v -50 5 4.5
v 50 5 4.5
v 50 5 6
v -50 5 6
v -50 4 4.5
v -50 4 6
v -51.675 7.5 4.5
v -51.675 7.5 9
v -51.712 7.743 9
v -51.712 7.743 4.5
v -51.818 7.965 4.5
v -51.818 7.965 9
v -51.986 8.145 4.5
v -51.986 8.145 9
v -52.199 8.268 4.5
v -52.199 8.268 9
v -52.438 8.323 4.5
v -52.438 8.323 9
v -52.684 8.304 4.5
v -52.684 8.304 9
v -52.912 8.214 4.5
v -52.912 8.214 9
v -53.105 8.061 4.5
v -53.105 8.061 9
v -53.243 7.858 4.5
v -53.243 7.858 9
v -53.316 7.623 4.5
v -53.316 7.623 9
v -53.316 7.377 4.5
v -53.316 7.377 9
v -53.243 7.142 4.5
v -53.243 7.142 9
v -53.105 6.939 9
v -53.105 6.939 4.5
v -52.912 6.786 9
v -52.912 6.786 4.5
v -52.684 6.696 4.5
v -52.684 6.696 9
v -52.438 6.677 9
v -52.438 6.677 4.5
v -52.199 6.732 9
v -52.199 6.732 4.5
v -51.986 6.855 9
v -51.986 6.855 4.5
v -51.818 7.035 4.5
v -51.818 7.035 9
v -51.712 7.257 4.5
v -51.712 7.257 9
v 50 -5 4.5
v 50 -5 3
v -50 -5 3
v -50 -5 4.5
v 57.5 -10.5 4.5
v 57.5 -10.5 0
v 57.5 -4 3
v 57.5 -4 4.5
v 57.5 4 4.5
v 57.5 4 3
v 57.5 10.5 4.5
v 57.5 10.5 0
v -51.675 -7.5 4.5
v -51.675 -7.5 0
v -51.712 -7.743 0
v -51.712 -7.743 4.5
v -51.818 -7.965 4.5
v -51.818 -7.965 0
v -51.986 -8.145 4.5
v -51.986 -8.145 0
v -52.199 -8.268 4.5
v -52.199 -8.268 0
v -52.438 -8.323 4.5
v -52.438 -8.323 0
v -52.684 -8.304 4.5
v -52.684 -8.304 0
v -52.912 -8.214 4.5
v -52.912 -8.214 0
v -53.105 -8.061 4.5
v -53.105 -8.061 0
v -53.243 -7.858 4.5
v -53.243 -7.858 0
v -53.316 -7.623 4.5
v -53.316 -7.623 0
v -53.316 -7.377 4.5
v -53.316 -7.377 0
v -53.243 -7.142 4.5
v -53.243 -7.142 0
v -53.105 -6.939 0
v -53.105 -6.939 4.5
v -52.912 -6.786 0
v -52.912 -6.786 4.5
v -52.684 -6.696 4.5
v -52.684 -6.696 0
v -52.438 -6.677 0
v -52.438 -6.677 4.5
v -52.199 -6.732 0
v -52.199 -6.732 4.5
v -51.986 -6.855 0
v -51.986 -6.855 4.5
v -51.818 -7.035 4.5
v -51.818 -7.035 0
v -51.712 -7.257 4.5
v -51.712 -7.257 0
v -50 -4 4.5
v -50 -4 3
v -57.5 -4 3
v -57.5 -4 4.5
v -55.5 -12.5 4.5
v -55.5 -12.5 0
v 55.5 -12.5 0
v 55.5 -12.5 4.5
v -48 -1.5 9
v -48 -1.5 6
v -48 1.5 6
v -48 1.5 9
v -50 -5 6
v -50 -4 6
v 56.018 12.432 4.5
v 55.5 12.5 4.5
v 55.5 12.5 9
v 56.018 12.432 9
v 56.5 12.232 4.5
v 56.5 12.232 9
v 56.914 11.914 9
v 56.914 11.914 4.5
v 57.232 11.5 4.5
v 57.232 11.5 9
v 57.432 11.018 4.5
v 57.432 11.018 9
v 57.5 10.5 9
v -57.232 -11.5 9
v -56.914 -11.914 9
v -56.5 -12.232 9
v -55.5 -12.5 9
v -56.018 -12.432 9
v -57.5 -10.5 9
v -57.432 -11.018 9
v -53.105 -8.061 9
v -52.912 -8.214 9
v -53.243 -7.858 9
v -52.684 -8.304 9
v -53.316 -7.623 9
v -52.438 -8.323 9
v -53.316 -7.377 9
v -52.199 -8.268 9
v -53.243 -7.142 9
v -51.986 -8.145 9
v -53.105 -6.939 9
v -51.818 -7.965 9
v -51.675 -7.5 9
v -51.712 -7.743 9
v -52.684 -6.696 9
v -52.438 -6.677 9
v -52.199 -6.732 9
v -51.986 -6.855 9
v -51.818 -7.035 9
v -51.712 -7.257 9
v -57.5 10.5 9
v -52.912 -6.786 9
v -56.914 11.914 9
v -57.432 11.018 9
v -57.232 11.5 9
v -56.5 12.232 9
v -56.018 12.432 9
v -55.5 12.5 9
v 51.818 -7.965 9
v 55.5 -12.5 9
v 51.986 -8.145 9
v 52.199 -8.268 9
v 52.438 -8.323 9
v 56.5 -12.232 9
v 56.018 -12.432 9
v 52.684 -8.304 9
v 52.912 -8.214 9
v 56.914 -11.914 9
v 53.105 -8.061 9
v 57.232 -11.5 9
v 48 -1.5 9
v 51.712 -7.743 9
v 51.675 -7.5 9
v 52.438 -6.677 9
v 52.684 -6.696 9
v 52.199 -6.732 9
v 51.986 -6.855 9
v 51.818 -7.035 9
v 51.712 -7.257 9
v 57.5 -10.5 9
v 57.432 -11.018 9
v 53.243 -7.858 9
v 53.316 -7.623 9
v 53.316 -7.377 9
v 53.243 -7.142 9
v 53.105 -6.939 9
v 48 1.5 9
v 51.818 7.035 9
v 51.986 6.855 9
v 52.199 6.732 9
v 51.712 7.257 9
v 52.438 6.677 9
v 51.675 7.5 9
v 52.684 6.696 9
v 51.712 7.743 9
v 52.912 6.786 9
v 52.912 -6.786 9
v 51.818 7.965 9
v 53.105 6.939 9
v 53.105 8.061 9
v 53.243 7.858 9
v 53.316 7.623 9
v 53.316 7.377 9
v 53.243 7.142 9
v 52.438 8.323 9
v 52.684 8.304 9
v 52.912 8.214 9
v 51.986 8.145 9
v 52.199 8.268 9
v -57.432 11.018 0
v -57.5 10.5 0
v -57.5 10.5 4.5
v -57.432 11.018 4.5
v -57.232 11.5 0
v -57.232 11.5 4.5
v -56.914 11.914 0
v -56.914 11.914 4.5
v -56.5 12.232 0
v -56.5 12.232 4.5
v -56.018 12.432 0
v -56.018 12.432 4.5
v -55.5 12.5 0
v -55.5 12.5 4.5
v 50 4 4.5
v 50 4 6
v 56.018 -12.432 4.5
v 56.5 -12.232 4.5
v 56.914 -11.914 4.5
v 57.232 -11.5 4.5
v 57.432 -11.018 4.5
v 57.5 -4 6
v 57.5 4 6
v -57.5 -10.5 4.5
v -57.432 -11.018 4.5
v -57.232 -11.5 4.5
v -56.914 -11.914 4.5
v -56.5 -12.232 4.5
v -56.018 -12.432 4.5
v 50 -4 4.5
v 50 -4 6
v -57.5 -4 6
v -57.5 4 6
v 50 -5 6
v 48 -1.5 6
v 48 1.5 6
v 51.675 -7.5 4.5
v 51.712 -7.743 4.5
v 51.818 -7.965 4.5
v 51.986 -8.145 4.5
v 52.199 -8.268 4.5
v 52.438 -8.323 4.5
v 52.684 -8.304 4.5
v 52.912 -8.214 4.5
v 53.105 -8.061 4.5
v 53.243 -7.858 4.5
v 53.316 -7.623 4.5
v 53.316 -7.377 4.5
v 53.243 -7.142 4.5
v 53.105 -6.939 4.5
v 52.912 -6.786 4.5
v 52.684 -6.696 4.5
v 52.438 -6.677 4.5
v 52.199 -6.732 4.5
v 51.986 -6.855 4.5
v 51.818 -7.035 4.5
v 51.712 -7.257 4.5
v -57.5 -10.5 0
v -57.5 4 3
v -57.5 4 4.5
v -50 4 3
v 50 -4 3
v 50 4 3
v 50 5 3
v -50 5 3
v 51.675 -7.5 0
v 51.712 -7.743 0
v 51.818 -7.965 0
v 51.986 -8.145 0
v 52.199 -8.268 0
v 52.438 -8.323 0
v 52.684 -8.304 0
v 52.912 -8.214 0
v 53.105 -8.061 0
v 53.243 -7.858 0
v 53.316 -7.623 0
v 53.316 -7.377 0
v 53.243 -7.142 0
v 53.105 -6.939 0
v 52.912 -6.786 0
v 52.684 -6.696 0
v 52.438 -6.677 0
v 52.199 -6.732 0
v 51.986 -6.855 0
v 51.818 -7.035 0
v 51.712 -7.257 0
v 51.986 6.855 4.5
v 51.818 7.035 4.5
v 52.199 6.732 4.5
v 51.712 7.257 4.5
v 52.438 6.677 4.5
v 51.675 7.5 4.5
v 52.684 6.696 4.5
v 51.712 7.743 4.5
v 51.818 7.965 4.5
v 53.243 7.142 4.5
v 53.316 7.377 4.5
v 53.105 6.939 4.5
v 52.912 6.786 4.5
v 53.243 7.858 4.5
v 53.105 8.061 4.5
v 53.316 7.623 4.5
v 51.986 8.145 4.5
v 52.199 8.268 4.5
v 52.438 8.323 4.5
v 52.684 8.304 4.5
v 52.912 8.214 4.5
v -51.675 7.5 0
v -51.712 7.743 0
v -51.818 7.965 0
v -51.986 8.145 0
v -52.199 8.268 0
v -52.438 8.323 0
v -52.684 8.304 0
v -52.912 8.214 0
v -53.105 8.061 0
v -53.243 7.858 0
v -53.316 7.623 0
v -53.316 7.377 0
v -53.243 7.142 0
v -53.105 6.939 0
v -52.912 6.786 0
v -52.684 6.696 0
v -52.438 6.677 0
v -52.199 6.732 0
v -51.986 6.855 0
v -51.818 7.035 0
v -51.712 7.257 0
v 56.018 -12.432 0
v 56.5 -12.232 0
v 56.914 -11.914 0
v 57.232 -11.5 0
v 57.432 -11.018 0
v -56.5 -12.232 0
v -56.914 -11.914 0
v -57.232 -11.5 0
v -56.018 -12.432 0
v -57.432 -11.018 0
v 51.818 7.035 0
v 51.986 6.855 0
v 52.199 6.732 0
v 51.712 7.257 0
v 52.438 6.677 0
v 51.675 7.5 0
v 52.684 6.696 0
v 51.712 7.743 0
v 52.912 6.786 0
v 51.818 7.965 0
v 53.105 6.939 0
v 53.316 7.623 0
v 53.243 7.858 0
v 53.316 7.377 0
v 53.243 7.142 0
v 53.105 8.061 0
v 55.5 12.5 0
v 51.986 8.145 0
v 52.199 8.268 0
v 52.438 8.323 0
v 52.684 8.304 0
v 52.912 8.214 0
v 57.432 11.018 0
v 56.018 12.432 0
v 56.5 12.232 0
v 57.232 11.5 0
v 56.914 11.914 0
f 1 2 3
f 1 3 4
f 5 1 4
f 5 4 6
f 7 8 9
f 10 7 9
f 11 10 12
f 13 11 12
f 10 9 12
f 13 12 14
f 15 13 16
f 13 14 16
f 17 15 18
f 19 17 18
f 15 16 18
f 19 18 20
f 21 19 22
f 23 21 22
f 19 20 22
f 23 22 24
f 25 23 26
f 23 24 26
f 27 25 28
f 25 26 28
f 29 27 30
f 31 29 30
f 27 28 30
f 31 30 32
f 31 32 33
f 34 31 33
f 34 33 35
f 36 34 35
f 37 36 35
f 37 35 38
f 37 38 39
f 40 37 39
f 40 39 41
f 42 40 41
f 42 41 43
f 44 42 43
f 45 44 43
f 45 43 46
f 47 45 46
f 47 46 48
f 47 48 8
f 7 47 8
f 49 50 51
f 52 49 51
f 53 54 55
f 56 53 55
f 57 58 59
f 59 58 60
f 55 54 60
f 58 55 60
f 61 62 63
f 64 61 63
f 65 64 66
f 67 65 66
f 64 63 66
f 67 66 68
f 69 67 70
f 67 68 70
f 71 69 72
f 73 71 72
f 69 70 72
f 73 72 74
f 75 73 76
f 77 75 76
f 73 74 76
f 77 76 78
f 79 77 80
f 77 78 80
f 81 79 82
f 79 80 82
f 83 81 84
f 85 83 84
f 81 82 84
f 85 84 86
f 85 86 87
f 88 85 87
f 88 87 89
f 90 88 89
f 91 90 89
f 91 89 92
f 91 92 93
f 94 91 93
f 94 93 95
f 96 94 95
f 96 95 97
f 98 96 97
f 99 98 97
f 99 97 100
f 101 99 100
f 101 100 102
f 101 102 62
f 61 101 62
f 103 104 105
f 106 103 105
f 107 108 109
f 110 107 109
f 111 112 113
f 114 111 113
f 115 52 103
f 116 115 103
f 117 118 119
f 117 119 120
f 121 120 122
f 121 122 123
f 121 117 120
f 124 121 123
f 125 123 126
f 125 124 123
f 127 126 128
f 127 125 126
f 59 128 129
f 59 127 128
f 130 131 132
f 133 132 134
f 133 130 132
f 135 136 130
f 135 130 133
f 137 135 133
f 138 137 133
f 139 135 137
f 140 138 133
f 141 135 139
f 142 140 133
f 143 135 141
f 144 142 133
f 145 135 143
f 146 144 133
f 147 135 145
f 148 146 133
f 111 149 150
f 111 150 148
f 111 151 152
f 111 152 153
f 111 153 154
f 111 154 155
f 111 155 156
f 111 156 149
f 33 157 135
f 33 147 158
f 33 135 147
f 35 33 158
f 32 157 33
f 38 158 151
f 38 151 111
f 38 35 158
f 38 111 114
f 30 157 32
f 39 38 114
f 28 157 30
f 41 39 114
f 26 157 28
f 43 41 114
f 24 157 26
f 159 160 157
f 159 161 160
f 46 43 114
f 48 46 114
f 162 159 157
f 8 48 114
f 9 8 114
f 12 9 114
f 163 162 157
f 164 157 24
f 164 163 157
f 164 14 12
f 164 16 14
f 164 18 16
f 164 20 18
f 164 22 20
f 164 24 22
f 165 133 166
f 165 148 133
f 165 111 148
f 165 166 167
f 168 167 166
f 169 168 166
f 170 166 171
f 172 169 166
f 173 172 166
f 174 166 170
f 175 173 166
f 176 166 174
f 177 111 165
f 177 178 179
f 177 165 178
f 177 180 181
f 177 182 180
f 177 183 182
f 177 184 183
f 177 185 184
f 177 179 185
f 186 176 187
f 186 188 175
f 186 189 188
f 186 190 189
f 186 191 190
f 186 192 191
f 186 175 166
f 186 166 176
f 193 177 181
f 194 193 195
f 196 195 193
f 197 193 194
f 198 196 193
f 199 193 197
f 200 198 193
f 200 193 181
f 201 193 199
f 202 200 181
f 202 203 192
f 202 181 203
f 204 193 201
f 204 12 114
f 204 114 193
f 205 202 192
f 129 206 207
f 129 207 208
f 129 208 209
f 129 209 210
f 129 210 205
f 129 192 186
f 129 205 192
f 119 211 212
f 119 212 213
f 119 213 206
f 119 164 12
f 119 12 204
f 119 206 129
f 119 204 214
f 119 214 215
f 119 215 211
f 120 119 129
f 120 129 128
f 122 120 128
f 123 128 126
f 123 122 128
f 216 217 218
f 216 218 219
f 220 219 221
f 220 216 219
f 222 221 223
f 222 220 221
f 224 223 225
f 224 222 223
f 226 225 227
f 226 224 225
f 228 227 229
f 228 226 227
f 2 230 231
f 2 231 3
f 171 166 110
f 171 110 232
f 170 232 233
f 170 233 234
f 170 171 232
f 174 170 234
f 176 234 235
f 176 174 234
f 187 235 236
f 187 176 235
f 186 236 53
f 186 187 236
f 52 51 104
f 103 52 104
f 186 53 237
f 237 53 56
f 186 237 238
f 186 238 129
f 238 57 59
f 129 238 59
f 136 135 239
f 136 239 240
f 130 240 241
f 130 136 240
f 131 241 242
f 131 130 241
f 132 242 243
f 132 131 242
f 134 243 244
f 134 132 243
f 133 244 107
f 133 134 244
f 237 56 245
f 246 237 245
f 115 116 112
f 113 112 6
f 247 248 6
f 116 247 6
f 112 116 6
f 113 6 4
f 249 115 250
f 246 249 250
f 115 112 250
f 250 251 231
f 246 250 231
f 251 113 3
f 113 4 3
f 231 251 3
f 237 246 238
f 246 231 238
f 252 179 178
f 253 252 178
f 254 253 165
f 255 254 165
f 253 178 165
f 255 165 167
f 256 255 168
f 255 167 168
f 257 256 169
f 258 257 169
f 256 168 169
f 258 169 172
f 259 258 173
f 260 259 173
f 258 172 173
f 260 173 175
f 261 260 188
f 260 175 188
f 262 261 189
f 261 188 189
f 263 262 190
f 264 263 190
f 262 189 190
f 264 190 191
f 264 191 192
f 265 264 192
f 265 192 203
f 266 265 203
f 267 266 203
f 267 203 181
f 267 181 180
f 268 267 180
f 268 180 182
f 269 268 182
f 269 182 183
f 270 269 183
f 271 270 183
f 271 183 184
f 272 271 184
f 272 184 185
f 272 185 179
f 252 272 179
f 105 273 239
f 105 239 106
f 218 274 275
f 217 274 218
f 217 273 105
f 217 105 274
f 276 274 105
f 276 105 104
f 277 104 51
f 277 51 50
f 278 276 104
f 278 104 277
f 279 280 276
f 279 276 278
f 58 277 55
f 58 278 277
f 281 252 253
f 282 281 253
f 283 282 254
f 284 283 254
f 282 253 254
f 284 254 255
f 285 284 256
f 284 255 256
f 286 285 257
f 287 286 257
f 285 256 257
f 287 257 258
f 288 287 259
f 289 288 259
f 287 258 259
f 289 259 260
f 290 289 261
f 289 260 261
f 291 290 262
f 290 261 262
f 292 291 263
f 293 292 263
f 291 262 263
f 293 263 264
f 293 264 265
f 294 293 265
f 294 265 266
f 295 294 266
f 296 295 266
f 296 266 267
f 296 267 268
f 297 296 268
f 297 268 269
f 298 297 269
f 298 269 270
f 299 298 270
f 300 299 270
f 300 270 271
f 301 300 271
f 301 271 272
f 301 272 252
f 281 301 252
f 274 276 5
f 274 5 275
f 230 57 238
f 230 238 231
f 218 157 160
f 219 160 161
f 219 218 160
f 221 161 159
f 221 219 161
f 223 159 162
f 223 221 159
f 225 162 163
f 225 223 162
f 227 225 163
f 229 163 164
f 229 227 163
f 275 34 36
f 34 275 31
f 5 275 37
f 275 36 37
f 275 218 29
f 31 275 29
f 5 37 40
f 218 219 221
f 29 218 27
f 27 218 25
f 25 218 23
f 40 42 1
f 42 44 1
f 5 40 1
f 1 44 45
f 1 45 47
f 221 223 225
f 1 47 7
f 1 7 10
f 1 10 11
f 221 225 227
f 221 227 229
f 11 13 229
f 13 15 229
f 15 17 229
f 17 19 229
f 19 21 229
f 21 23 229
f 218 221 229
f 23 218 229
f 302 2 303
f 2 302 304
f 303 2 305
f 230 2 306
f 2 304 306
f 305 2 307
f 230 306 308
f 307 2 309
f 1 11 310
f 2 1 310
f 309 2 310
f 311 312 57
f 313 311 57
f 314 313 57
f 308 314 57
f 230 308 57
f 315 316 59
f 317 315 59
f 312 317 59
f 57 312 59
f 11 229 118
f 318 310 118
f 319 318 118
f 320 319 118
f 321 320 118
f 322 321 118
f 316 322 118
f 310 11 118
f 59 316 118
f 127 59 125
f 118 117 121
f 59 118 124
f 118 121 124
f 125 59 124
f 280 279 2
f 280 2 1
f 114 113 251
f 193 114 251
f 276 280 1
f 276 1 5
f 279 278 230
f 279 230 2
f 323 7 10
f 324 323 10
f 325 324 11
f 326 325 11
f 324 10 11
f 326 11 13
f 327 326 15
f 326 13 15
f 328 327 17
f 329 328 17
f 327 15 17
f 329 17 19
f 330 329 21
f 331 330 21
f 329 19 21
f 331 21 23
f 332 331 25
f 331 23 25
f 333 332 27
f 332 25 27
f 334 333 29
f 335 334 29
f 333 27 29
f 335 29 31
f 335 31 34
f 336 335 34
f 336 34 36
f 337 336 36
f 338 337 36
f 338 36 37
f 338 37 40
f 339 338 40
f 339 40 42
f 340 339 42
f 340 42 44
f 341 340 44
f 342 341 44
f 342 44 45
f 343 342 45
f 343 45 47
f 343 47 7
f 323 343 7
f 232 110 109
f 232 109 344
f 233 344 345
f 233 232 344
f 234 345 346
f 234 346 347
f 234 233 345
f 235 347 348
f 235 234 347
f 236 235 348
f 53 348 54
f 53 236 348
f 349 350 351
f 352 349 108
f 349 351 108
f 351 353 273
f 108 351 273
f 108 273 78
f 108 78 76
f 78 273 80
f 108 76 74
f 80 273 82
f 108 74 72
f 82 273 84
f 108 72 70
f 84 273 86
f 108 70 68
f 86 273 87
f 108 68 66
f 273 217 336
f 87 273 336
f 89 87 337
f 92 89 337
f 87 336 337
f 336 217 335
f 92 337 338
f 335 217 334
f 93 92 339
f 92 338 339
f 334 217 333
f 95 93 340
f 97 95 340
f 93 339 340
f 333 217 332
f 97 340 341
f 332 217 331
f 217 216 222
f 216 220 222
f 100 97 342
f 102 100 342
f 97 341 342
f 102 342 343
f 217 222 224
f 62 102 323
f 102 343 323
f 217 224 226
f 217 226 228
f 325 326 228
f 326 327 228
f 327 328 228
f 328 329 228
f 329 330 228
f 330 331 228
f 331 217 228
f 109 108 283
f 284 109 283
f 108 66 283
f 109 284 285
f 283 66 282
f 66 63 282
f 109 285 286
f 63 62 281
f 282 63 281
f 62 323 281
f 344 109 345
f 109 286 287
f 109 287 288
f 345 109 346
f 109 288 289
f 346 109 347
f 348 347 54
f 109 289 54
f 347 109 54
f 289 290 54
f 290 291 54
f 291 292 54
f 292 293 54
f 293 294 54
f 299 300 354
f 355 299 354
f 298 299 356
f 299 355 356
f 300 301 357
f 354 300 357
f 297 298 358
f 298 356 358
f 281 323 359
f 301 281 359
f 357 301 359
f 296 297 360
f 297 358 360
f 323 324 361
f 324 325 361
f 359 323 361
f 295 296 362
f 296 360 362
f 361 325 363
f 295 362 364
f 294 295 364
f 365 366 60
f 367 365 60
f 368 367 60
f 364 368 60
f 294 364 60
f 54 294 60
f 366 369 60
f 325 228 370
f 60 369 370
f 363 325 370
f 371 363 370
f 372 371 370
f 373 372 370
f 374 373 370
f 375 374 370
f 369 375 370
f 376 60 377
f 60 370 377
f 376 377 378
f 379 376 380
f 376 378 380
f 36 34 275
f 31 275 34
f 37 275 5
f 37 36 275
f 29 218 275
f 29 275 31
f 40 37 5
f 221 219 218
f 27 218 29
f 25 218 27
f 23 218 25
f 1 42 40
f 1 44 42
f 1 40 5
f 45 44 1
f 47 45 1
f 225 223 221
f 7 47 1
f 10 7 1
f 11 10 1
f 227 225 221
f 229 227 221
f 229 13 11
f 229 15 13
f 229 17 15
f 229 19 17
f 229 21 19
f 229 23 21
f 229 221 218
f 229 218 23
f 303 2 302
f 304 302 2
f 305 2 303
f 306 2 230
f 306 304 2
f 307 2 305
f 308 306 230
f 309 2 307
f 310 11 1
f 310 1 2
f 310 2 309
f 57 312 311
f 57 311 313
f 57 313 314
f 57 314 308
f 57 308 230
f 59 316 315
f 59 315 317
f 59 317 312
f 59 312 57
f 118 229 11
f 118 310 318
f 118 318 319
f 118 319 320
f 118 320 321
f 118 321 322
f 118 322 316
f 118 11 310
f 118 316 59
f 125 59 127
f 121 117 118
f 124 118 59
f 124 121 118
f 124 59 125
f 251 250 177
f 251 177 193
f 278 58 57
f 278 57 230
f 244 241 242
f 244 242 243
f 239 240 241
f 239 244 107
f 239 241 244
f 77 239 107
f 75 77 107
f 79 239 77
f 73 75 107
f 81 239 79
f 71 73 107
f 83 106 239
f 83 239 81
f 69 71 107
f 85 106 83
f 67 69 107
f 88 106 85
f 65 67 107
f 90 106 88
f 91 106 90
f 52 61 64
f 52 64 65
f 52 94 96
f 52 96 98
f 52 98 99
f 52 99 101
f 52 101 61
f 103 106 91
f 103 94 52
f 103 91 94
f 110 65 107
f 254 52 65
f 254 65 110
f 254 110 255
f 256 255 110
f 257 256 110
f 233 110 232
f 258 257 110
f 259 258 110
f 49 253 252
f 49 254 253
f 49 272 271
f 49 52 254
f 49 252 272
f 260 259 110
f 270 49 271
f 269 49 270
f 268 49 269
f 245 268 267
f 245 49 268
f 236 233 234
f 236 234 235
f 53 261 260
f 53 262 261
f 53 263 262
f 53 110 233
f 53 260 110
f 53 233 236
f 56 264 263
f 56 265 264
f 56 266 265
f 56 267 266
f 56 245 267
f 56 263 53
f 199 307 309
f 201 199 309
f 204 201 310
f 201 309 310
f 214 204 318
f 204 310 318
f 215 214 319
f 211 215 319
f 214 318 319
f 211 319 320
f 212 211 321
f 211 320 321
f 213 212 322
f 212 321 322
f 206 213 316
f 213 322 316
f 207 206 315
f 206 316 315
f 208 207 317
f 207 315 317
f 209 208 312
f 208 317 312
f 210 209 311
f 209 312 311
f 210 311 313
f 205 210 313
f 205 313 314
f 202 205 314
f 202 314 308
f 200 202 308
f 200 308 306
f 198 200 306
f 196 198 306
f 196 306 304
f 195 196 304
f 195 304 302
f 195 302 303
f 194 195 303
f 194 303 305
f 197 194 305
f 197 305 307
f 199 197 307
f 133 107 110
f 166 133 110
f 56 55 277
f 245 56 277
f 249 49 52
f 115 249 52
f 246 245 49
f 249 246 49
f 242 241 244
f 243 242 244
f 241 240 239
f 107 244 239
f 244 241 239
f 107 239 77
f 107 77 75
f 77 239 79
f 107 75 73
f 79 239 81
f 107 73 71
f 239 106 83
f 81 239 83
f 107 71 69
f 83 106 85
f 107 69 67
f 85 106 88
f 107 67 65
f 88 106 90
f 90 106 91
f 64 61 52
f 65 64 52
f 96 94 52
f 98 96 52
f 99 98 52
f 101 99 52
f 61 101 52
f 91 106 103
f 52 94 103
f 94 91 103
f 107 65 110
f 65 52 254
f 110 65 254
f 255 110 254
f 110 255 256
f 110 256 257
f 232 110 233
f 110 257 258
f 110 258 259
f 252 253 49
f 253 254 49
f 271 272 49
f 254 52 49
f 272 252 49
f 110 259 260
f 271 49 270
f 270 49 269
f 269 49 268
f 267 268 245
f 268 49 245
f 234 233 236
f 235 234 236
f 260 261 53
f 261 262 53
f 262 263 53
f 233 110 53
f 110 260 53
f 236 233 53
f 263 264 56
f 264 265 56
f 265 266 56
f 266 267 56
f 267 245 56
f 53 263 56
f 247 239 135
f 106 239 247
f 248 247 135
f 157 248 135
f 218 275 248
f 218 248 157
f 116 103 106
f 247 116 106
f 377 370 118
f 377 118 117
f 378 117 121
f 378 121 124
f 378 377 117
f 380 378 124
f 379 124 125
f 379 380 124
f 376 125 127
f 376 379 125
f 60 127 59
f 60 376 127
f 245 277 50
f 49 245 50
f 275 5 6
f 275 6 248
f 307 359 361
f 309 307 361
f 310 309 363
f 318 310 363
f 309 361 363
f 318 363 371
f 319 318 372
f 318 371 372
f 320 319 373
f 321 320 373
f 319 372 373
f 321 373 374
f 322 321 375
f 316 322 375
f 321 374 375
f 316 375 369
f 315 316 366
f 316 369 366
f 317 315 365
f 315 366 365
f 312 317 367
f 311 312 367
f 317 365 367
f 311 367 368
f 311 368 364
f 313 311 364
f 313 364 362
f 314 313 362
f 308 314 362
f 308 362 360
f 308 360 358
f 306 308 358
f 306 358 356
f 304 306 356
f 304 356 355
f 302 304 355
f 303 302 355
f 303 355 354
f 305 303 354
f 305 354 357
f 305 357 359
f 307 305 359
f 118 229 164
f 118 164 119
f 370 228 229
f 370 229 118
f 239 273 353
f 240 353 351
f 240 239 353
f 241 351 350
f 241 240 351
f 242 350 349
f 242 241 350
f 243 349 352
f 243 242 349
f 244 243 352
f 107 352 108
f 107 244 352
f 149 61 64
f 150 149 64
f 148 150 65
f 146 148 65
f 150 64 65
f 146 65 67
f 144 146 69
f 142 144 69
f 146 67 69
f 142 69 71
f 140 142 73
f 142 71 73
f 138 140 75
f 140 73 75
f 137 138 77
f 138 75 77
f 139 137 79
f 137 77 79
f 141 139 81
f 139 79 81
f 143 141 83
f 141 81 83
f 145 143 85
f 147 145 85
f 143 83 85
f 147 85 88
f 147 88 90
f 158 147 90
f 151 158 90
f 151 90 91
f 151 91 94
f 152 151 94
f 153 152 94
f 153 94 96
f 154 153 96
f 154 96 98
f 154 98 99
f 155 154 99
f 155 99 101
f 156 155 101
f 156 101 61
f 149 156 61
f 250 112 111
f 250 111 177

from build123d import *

# Parameters (mm, degrees)
BOX_BOTTOM_HALF_0_W     = 117
BOX_BOTTOM_HALF_0_H     = 27
BOX_BOTTOM_HALF_0_DEPTH = 5.5
SKETCH_W                = 115
SKETCH_H                = 25
PAD_DEPTH               = 3
PAD001_DEPTH            = 3
SKETCH002_W             = 115
SKETCH002_H             = 25
SKETCH002_W_2           = 96
SKETCH002_H_2           = 3
PAD002_DEPTH            = 3
SKETCH003_R             = 0.825
POCKET_DEPTH            = 245.060315
POLARPATTERN_COUNT      = 2
POLARPATTERN001_COUNT   = 2
POLARPATTERN002_COUNT   = 2
FILLET_R                = 2


with BuildPart() as box_bottom_half_0_body:
    # box_bottom_half_0 → box_bottom_half_0 (new body)
    with BuildSketch(Plane(origin=(-58.5, -13.5, -1), x_dir=(1, 0, 0), z_dir=(0, 0, 1))):
        with Locations((58.5, 13.5)):
            Rectangle(BOX_BOTTOM_HALF_0_W, BOX_BOTTOM_HALF_0_H)
    extrude(amount=BOX_BOTTOM_HALF_0_DEPTH)


with BuildPart() as body:
    # Sketch → Pad (new body)
    with BuildSketch(Plane.XY):
        Rectangle(SKETCH_W, SKETCH_H)
    extrude(amount=PAD_DEPTH)

    # Sketch001 (on Face6 of Pad) → Pad001 (join)
    with BuildSketch(Plane.XY.offset(3)):
        Polygon((-57.5, 12.5), (57.5, 12.5), (57.5, 4), (50, 4), (50, 5), (-50, 5), (-50, 4), (-57.5, 4), align=None)
        Polygon((-57.5, -12.5), (57.5, -12.5), (57.5, -4), (50, -4), (50, -5), (-50, -5), (-50, -4), (-57.5, -4), align=None)
    extrude(amount=PAD001_DEPTH)

    # Sketch002 (on Face12 of Pad001) → Pad002 (join)
    with BuildSketch(Plane.XY.offset(6)):
        Rectangle(SKETCH002_W, SKETCH002_H)
        Rectangle(SKETCH002_W_2, SKETCH002_H_2, mode=Mode.SUBTRACT)
    extrude(amount=PAD002_DEPTH)

    # Sketch003 (on Face26 of Pad002) → Pocket (cut, through all)
    with BuildSketch(Plane.XY.offset(9)):
        with Locations((-52.5, 7.5)):
            Circle(SKETCH003_R)
    pocket = extrude(amount=-POCKET_DEPTH, mode=Mode.SUBTRACT)

    # PolarPattern: Pocket ×2 about axis
    polarpattern_axis = Axis((0, 0, 0), (0, 1, 0))
    for i in range(1, POLARPATTERN_COUNT):
        add(pocket.rotate(polarpattern_axis, i * 360 / POLARPATTERN_COUNT), mode=Mode.SUBTRACT)

    # PolarPattern001: Pocket ×2 about axis
    polarpattern001_axis = Axis((0, 0, 0), (1, 0, 0))
    for i in range(1, POLARPATTERN001_COUNT):
        add(pocket.rotate(polarpattern001_axis, i * 360 / POLARPATTERN001_COUNT), mode=Mode.SUBTRACT)

    # PolarPattern002: Pocket ×2 about axis
    polarpattern002_axis = Axis((0, 0, 9), (0, 0, 1))
    for i in range(1, POLARPATTERN002_COUNT):
        add(pocket.rotate(polarpattern002_axis, i * 360 / POLARPATTERN002_COUNT), mode=Mode.SUBTRACT)

    # Fillet
    fillet_edges = [body.edges().sort_by_distance(p)[0] for p in [
        (57.5, 12.5, 7.5),
        (57.5, 12.5, 4.5),
        (57.5, 12.5, 1.5),
        (57.5, -12.5, 7.5),
        (-57.5, 12.5, 7.5),
        (-57.5, -12.5, 7.5),
    ]]
    fillet(fillet_edges, radius=FILLET_R)


with BuildPart() as bottom_half_0_body:
    # bottom_half_0 base: copy of Body
    add(body.part)

    # bottom_half_0: intersect box_bottom_half_0 body
    add(box_bottom_half_0_body.part, mode=Mode.INTERSECT)


with BuildPart() as top_half_0_body:
    # top_half_0 base: copy of Body
    add(body.part)

    # top_half_0: cut box_bottom_half_0 body
    add(box_bottom_half_0_body.part, mode=Mode.SUBTRACT)


solid = Compound([bottom_half_0_body.part, top_half_0_body.part])
